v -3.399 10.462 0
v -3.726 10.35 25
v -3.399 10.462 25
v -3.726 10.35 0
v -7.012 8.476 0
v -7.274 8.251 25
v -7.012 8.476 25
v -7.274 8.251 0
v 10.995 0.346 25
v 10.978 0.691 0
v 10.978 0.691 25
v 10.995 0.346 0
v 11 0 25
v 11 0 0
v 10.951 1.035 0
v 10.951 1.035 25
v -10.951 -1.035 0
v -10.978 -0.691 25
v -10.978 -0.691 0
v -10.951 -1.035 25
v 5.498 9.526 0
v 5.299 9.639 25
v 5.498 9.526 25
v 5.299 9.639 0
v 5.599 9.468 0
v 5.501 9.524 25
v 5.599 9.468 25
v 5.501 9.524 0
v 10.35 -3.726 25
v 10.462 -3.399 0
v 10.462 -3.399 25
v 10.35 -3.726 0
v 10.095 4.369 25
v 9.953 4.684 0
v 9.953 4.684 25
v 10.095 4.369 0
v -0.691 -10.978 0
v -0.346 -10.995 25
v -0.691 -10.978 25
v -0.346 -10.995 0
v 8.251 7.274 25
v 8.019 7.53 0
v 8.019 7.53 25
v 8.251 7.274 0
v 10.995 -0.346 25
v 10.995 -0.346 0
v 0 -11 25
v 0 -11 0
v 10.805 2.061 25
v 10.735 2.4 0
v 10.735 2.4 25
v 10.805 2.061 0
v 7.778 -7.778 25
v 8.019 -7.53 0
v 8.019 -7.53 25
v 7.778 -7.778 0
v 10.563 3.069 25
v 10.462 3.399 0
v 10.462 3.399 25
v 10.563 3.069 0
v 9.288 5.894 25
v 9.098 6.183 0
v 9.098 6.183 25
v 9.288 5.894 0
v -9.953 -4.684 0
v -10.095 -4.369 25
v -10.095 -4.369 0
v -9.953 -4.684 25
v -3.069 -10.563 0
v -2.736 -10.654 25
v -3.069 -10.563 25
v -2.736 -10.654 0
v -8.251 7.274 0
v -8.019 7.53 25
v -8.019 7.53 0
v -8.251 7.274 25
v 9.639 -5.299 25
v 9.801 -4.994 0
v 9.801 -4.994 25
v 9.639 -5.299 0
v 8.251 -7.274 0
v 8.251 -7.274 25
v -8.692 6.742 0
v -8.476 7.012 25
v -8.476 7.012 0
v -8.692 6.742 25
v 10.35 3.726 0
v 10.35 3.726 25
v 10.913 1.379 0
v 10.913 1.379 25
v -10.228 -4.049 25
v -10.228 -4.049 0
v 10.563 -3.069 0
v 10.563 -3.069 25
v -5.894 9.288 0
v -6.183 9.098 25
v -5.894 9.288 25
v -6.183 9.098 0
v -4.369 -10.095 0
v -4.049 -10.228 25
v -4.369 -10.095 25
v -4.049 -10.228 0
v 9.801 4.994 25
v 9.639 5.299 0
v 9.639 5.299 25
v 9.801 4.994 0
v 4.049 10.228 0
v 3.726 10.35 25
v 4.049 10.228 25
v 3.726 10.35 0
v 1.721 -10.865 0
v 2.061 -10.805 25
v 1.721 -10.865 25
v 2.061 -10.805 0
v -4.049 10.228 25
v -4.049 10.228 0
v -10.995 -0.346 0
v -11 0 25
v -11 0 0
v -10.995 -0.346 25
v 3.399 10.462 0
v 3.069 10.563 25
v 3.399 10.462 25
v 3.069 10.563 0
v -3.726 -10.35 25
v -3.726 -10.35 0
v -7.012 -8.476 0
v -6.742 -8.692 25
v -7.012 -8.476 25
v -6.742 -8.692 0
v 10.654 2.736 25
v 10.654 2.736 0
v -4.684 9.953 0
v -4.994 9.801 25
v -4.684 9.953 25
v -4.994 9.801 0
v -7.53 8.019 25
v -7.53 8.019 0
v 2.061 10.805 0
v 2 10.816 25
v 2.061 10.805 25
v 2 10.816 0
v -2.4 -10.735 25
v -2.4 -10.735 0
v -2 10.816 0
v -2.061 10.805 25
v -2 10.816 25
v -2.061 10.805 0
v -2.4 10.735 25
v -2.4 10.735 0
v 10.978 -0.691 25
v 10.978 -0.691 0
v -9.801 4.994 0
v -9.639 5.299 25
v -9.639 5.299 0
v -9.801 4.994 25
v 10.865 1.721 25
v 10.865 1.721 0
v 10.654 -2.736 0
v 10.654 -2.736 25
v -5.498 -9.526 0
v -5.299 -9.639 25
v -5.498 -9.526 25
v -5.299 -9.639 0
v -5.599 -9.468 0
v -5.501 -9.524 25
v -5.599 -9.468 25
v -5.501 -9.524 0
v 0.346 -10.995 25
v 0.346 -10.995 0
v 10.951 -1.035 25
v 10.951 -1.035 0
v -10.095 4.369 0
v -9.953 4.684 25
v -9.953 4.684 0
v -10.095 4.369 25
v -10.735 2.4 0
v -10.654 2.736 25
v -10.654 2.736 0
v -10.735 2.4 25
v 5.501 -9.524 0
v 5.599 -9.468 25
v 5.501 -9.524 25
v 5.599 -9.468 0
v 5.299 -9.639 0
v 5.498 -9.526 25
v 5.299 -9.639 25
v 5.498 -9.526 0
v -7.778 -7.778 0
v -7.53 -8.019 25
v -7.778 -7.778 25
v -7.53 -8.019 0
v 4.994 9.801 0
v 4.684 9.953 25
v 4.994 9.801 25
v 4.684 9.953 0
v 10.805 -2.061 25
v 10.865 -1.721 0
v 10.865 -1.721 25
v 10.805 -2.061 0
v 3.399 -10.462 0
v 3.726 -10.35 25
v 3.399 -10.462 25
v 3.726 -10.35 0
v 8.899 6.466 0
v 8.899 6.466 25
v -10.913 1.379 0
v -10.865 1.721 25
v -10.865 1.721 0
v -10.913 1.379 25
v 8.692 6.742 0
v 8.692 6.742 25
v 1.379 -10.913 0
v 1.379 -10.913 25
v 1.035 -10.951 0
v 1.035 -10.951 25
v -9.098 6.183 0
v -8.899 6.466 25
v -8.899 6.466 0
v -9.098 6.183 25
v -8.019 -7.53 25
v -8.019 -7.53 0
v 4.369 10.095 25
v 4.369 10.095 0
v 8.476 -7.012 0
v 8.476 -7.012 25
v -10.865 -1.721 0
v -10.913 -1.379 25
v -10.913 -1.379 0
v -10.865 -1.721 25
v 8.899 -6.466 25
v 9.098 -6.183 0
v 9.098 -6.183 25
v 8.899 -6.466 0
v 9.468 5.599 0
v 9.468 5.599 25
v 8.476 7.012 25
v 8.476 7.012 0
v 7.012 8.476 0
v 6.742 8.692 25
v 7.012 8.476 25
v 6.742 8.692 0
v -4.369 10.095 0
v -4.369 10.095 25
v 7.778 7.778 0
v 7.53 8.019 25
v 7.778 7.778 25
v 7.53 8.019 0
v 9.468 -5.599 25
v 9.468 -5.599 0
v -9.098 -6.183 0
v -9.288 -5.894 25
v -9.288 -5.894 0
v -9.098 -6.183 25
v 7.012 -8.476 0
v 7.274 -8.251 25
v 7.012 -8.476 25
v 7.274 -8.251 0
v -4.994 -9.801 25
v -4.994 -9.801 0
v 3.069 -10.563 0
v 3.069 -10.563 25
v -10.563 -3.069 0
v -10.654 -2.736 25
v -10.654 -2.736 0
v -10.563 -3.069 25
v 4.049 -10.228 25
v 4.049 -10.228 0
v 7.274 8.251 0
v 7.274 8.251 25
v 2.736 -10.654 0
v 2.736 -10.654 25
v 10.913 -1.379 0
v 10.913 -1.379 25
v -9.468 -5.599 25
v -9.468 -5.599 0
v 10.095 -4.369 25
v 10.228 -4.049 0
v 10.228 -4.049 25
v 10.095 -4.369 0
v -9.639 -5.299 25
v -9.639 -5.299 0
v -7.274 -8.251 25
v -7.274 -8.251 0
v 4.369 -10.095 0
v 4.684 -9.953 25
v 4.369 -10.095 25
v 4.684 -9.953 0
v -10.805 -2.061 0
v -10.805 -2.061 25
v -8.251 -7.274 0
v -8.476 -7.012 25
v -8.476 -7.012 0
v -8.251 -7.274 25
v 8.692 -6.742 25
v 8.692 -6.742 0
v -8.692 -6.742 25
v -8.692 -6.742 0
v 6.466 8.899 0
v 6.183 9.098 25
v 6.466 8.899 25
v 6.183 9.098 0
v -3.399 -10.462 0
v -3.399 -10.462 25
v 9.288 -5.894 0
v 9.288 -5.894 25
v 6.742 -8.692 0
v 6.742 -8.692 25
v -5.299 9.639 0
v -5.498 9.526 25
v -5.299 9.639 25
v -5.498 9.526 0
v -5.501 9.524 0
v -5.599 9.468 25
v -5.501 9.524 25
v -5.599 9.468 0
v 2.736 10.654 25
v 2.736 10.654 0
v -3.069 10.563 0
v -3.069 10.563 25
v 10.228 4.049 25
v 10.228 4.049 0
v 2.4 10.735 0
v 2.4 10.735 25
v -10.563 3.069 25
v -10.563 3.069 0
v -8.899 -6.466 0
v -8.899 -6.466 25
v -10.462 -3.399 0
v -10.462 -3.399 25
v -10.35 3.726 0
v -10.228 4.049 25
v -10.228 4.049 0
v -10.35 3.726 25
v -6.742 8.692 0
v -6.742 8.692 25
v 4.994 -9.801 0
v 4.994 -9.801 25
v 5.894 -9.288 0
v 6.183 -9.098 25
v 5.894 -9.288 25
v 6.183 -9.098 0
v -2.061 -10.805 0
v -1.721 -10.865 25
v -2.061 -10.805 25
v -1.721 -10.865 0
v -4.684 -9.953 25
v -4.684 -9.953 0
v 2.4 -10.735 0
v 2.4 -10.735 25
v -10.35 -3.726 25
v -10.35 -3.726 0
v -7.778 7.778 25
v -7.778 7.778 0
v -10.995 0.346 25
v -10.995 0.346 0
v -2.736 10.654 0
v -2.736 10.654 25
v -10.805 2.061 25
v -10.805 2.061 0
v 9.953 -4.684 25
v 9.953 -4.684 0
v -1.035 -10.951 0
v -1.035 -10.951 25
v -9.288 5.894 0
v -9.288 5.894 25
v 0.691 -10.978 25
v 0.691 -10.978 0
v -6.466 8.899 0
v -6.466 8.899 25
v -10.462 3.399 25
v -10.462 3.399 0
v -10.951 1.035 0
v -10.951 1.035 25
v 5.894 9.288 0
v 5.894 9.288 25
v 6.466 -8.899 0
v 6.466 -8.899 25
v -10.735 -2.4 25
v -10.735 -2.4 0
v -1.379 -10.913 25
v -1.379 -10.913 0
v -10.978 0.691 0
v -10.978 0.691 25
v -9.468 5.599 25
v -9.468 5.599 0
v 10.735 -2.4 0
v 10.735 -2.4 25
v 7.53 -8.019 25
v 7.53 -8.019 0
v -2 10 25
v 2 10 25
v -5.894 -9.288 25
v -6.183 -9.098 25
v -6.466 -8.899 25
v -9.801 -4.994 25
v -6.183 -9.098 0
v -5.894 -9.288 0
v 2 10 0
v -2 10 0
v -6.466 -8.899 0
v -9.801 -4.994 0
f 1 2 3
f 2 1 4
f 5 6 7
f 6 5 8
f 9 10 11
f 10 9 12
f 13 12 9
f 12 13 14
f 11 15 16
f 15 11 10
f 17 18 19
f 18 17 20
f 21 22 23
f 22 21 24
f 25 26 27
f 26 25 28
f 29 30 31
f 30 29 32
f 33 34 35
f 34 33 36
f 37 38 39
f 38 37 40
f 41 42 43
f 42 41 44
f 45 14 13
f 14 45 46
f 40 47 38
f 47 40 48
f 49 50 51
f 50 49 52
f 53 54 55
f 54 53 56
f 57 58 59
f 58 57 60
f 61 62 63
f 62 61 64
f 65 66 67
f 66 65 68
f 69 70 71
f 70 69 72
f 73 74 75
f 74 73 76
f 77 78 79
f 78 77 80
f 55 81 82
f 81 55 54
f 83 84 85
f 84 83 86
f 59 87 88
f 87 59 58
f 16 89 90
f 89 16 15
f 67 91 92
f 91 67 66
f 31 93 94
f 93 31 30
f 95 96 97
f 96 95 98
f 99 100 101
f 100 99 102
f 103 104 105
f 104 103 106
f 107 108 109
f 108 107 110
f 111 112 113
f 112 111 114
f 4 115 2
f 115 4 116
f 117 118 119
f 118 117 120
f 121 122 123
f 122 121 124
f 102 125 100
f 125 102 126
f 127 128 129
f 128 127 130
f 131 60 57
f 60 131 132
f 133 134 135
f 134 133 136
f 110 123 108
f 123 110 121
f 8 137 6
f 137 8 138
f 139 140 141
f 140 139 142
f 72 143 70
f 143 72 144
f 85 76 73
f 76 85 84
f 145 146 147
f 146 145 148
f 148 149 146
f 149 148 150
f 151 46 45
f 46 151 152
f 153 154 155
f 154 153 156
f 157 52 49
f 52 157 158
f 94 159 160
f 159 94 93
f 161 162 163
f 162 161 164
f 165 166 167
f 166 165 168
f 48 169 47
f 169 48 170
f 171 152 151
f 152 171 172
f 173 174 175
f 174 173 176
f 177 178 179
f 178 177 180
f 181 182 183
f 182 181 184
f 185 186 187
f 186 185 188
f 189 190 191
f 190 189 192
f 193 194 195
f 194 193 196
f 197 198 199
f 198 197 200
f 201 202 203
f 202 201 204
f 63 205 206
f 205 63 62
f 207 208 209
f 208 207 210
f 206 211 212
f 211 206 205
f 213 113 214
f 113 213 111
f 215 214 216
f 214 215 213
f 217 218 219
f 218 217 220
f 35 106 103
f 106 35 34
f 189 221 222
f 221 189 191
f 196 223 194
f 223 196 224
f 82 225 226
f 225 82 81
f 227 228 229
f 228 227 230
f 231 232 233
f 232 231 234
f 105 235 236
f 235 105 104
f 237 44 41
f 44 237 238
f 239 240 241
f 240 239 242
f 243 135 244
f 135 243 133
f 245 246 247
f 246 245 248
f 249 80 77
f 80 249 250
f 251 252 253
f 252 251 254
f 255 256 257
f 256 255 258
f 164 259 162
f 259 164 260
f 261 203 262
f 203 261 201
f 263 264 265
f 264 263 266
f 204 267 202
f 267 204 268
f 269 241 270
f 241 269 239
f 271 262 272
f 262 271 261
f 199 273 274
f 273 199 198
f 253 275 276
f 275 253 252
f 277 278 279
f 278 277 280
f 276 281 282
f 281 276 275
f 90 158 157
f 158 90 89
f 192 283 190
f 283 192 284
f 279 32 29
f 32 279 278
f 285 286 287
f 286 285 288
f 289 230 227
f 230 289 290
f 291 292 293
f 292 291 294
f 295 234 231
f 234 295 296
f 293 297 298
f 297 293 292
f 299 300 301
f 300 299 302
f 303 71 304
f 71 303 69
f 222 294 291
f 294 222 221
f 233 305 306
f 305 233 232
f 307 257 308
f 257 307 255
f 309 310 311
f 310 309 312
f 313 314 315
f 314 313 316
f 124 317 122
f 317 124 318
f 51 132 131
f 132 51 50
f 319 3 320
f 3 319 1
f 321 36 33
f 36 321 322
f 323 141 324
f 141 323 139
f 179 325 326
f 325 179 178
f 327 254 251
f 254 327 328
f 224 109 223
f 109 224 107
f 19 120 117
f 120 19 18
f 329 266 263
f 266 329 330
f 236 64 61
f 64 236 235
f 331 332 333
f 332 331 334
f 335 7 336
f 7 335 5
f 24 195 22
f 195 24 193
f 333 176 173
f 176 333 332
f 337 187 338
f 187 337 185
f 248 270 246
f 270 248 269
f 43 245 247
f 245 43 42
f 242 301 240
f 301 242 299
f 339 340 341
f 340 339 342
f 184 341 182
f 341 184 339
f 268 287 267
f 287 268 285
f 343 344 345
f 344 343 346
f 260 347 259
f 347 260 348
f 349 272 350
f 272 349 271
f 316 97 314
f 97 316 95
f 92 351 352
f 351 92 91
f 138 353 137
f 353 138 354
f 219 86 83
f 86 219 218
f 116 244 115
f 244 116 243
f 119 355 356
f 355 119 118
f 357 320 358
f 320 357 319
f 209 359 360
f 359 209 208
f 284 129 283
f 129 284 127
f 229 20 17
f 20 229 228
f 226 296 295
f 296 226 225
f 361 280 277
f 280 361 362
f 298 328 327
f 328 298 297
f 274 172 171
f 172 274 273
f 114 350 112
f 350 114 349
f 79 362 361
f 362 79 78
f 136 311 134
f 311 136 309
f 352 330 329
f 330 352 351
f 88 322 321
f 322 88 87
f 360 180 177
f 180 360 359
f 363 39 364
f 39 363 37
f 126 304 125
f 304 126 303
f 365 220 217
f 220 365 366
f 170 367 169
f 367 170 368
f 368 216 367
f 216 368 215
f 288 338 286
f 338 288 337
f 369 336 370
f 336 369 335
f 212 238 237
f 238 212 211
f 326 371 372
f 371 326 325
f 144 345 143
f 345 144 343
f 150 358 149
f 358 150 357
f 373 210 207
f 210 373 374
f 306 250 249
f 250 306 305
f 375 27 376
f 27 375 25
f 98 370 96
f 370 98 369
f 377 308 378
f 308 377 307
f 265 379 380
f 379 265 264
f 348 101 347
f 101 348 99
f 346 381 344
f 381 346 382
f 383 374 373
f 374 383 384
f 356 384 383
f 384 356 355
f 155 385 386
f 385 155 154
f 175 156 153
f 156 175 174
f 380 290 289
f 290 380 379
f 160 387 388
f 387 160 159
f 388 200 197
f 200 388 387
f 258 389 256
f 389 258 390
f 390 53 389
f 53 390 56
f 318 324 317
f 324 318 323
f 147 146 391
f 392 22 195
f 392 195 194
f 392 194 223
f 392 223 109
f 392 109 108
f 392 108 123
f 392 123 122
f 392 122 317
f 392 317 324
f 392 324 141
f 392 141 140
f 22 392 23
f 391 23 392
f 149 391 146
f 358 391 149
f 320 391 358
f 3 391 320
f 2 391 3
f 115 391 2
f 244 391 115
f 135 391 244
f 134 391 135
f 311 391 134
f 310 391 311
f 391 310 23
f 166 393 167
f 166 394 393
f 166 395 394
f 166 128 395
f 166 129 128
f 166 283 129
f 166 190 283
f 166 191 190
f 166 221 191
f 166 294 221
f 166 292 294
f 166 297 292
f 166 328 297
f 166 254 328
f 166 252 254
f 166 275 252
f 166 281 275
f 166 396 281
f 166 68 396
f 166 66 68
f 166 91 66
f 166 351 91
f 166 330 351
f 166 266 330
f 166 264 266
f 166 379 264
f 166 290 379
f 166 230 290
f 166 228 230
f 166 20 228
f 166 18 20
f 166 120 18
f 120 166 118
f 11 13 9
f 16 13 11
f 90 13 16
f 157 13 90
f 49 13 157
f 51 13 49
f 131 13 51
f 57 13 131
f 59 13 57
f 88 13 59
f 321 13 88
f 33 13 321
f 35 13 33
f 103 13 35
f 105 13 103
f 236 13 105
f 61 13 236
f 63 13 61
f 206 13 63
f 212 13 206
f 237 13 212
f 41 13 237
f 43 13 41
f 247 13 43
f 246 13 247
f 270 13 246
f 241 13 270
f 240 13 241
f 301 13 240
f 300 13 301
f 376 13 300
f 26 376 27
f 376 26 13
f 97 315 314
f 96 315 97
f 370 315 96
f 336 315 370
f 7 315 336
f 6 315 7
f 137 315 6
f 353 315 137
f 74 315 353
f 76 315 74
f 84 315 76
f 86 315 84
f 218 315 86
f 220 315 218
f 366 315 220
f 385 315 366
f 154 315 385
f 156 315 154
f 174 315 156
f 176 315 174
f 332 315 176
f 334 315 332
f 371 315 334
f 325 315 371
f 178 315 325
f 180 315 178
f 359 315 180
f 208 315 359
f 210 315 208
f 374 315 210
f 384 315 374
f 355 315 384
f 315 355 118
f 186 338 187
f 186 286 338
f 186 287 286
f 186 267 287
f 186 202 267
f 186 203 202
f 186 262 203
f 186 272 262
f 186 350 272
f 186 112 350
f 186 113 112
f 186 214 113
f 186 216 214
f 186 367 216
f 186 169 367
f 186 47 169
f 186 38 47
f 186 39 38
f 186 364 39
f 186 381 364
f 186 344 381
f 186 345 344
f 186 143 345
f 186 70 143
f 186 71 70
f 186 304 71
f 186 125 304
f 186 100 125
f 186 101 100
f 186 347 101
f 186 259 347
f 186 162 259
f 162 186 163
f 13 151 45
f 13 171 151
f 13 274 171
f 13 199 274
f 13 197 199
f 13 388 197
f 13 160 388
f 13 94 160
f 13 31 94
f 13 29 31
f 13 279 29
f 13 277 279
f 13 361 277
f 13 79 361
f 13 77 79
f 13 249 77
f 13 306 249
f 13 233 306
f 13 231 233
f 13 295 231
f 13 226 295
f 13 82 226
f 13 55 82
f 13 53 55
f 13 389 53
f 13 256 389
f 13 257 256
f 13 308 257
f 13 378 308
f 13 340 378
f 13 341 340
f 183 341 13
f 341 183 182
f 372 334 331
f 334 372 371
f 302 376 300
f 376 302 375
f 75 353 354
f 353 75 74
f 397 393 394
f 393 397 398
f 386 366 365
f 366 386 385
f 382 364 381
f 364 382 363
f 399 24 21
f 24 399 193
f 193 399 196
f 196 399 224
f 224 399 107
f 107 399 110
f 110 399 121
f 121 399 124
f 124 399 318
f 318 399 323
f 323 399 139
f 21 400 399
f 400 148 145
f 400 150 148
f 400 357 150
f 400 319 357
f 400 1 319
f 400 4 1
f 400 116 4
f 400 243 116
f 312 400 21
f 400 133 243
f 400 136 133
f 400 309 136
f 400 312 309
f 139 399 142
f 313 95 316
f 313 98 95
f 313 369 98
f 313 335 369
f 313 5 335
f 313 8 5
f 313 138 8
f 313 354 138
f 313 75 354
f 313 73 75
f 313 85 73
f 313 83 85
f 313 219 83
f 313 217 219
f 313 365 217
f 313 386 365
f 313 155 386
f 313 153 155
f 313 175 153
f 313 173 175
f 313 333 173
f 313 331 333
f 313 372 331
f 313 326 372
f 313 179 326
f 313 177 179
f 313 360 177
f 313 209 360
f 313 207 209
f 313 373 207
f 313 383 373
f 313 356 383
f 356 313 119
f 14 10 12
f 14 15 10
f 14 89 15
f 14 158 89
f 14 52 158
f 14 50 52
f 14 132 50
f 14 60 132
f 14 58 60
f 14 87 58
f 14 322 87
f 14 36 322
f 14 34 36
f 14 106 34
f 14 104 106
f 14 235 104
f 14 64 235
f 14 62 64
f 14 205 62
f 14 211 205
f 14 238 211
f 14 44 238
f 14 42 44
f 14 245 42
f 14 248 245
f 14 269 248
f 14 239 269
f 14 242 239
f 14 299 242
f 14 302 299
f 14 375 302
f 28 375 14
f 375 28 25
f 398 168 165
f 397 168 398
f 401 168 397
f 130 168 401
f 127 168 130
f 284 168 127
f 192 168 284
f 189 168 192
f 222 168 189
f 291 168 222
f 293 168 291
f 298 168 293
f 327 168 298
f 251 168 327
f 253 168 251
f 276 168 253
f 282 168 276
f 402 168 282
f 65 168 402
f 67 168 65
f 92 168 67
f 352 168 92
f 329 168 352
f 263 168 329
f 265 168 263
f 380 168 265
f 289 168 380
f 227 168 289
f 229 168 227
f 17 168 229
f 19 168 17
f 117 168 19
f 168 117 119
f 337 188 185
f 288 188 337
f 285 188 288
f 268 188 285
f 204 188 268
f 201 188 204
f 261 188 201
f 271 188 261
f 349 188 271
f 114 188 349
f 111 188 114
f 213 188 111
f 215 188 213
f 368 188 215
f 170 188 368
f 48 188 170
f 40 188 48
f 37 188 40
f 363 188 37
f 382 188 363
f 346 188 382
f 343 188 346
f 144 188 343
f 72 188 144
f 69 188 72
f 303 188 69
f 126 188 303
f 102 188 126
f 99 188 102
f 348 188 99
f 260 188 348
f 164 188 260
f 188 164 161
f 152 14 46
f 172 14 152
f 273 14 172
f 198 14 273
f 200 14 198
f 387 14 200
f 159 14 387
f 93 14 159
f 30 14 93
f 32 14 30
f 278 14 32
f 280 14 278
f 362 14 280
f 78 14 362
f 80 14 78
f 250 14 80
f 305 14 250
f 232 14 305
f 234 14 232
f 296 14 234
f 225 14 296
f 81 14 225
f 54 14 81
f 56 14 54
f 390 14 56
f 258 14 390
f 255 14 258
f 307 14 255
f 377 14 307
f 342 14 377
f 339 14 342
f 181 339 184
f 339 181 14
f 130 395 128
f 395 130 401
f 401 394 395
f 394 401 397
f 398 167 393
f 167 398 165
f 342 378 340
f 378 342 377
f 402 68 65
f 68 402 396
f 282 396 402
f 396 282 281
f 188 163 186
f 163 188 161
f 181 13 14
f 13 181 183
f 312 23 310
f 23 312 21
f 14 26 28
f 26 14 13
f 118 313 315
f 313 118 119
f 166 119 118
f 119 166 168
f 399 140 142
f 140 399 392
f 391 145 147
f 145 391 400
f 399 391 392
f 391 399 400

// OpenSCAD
SHAFT_DIA = 22;
HEX_SHAFT_DIA = 22;
KEY_WIDTH = 4;
KEY_HEIGHT = 4;
KEY_DEPTH = 3;
HEIGHT = 25;

$fn = 200;

difference() {
  cylinder(d = SHAFT_DIA, h = HEIGHT);
  #cylinder(d = HEX_SHAFT_DIA, h = HEIGHT, $fn = 6);

 #translate([-KEY_WIDTH/2, SHAFT_DIA/2 - (KEY_HEIGHT - KEY_DEPTH), 0])
  cube([KEY_WIDTH, KEY_HEIGHT, HEIGHT]);
}
